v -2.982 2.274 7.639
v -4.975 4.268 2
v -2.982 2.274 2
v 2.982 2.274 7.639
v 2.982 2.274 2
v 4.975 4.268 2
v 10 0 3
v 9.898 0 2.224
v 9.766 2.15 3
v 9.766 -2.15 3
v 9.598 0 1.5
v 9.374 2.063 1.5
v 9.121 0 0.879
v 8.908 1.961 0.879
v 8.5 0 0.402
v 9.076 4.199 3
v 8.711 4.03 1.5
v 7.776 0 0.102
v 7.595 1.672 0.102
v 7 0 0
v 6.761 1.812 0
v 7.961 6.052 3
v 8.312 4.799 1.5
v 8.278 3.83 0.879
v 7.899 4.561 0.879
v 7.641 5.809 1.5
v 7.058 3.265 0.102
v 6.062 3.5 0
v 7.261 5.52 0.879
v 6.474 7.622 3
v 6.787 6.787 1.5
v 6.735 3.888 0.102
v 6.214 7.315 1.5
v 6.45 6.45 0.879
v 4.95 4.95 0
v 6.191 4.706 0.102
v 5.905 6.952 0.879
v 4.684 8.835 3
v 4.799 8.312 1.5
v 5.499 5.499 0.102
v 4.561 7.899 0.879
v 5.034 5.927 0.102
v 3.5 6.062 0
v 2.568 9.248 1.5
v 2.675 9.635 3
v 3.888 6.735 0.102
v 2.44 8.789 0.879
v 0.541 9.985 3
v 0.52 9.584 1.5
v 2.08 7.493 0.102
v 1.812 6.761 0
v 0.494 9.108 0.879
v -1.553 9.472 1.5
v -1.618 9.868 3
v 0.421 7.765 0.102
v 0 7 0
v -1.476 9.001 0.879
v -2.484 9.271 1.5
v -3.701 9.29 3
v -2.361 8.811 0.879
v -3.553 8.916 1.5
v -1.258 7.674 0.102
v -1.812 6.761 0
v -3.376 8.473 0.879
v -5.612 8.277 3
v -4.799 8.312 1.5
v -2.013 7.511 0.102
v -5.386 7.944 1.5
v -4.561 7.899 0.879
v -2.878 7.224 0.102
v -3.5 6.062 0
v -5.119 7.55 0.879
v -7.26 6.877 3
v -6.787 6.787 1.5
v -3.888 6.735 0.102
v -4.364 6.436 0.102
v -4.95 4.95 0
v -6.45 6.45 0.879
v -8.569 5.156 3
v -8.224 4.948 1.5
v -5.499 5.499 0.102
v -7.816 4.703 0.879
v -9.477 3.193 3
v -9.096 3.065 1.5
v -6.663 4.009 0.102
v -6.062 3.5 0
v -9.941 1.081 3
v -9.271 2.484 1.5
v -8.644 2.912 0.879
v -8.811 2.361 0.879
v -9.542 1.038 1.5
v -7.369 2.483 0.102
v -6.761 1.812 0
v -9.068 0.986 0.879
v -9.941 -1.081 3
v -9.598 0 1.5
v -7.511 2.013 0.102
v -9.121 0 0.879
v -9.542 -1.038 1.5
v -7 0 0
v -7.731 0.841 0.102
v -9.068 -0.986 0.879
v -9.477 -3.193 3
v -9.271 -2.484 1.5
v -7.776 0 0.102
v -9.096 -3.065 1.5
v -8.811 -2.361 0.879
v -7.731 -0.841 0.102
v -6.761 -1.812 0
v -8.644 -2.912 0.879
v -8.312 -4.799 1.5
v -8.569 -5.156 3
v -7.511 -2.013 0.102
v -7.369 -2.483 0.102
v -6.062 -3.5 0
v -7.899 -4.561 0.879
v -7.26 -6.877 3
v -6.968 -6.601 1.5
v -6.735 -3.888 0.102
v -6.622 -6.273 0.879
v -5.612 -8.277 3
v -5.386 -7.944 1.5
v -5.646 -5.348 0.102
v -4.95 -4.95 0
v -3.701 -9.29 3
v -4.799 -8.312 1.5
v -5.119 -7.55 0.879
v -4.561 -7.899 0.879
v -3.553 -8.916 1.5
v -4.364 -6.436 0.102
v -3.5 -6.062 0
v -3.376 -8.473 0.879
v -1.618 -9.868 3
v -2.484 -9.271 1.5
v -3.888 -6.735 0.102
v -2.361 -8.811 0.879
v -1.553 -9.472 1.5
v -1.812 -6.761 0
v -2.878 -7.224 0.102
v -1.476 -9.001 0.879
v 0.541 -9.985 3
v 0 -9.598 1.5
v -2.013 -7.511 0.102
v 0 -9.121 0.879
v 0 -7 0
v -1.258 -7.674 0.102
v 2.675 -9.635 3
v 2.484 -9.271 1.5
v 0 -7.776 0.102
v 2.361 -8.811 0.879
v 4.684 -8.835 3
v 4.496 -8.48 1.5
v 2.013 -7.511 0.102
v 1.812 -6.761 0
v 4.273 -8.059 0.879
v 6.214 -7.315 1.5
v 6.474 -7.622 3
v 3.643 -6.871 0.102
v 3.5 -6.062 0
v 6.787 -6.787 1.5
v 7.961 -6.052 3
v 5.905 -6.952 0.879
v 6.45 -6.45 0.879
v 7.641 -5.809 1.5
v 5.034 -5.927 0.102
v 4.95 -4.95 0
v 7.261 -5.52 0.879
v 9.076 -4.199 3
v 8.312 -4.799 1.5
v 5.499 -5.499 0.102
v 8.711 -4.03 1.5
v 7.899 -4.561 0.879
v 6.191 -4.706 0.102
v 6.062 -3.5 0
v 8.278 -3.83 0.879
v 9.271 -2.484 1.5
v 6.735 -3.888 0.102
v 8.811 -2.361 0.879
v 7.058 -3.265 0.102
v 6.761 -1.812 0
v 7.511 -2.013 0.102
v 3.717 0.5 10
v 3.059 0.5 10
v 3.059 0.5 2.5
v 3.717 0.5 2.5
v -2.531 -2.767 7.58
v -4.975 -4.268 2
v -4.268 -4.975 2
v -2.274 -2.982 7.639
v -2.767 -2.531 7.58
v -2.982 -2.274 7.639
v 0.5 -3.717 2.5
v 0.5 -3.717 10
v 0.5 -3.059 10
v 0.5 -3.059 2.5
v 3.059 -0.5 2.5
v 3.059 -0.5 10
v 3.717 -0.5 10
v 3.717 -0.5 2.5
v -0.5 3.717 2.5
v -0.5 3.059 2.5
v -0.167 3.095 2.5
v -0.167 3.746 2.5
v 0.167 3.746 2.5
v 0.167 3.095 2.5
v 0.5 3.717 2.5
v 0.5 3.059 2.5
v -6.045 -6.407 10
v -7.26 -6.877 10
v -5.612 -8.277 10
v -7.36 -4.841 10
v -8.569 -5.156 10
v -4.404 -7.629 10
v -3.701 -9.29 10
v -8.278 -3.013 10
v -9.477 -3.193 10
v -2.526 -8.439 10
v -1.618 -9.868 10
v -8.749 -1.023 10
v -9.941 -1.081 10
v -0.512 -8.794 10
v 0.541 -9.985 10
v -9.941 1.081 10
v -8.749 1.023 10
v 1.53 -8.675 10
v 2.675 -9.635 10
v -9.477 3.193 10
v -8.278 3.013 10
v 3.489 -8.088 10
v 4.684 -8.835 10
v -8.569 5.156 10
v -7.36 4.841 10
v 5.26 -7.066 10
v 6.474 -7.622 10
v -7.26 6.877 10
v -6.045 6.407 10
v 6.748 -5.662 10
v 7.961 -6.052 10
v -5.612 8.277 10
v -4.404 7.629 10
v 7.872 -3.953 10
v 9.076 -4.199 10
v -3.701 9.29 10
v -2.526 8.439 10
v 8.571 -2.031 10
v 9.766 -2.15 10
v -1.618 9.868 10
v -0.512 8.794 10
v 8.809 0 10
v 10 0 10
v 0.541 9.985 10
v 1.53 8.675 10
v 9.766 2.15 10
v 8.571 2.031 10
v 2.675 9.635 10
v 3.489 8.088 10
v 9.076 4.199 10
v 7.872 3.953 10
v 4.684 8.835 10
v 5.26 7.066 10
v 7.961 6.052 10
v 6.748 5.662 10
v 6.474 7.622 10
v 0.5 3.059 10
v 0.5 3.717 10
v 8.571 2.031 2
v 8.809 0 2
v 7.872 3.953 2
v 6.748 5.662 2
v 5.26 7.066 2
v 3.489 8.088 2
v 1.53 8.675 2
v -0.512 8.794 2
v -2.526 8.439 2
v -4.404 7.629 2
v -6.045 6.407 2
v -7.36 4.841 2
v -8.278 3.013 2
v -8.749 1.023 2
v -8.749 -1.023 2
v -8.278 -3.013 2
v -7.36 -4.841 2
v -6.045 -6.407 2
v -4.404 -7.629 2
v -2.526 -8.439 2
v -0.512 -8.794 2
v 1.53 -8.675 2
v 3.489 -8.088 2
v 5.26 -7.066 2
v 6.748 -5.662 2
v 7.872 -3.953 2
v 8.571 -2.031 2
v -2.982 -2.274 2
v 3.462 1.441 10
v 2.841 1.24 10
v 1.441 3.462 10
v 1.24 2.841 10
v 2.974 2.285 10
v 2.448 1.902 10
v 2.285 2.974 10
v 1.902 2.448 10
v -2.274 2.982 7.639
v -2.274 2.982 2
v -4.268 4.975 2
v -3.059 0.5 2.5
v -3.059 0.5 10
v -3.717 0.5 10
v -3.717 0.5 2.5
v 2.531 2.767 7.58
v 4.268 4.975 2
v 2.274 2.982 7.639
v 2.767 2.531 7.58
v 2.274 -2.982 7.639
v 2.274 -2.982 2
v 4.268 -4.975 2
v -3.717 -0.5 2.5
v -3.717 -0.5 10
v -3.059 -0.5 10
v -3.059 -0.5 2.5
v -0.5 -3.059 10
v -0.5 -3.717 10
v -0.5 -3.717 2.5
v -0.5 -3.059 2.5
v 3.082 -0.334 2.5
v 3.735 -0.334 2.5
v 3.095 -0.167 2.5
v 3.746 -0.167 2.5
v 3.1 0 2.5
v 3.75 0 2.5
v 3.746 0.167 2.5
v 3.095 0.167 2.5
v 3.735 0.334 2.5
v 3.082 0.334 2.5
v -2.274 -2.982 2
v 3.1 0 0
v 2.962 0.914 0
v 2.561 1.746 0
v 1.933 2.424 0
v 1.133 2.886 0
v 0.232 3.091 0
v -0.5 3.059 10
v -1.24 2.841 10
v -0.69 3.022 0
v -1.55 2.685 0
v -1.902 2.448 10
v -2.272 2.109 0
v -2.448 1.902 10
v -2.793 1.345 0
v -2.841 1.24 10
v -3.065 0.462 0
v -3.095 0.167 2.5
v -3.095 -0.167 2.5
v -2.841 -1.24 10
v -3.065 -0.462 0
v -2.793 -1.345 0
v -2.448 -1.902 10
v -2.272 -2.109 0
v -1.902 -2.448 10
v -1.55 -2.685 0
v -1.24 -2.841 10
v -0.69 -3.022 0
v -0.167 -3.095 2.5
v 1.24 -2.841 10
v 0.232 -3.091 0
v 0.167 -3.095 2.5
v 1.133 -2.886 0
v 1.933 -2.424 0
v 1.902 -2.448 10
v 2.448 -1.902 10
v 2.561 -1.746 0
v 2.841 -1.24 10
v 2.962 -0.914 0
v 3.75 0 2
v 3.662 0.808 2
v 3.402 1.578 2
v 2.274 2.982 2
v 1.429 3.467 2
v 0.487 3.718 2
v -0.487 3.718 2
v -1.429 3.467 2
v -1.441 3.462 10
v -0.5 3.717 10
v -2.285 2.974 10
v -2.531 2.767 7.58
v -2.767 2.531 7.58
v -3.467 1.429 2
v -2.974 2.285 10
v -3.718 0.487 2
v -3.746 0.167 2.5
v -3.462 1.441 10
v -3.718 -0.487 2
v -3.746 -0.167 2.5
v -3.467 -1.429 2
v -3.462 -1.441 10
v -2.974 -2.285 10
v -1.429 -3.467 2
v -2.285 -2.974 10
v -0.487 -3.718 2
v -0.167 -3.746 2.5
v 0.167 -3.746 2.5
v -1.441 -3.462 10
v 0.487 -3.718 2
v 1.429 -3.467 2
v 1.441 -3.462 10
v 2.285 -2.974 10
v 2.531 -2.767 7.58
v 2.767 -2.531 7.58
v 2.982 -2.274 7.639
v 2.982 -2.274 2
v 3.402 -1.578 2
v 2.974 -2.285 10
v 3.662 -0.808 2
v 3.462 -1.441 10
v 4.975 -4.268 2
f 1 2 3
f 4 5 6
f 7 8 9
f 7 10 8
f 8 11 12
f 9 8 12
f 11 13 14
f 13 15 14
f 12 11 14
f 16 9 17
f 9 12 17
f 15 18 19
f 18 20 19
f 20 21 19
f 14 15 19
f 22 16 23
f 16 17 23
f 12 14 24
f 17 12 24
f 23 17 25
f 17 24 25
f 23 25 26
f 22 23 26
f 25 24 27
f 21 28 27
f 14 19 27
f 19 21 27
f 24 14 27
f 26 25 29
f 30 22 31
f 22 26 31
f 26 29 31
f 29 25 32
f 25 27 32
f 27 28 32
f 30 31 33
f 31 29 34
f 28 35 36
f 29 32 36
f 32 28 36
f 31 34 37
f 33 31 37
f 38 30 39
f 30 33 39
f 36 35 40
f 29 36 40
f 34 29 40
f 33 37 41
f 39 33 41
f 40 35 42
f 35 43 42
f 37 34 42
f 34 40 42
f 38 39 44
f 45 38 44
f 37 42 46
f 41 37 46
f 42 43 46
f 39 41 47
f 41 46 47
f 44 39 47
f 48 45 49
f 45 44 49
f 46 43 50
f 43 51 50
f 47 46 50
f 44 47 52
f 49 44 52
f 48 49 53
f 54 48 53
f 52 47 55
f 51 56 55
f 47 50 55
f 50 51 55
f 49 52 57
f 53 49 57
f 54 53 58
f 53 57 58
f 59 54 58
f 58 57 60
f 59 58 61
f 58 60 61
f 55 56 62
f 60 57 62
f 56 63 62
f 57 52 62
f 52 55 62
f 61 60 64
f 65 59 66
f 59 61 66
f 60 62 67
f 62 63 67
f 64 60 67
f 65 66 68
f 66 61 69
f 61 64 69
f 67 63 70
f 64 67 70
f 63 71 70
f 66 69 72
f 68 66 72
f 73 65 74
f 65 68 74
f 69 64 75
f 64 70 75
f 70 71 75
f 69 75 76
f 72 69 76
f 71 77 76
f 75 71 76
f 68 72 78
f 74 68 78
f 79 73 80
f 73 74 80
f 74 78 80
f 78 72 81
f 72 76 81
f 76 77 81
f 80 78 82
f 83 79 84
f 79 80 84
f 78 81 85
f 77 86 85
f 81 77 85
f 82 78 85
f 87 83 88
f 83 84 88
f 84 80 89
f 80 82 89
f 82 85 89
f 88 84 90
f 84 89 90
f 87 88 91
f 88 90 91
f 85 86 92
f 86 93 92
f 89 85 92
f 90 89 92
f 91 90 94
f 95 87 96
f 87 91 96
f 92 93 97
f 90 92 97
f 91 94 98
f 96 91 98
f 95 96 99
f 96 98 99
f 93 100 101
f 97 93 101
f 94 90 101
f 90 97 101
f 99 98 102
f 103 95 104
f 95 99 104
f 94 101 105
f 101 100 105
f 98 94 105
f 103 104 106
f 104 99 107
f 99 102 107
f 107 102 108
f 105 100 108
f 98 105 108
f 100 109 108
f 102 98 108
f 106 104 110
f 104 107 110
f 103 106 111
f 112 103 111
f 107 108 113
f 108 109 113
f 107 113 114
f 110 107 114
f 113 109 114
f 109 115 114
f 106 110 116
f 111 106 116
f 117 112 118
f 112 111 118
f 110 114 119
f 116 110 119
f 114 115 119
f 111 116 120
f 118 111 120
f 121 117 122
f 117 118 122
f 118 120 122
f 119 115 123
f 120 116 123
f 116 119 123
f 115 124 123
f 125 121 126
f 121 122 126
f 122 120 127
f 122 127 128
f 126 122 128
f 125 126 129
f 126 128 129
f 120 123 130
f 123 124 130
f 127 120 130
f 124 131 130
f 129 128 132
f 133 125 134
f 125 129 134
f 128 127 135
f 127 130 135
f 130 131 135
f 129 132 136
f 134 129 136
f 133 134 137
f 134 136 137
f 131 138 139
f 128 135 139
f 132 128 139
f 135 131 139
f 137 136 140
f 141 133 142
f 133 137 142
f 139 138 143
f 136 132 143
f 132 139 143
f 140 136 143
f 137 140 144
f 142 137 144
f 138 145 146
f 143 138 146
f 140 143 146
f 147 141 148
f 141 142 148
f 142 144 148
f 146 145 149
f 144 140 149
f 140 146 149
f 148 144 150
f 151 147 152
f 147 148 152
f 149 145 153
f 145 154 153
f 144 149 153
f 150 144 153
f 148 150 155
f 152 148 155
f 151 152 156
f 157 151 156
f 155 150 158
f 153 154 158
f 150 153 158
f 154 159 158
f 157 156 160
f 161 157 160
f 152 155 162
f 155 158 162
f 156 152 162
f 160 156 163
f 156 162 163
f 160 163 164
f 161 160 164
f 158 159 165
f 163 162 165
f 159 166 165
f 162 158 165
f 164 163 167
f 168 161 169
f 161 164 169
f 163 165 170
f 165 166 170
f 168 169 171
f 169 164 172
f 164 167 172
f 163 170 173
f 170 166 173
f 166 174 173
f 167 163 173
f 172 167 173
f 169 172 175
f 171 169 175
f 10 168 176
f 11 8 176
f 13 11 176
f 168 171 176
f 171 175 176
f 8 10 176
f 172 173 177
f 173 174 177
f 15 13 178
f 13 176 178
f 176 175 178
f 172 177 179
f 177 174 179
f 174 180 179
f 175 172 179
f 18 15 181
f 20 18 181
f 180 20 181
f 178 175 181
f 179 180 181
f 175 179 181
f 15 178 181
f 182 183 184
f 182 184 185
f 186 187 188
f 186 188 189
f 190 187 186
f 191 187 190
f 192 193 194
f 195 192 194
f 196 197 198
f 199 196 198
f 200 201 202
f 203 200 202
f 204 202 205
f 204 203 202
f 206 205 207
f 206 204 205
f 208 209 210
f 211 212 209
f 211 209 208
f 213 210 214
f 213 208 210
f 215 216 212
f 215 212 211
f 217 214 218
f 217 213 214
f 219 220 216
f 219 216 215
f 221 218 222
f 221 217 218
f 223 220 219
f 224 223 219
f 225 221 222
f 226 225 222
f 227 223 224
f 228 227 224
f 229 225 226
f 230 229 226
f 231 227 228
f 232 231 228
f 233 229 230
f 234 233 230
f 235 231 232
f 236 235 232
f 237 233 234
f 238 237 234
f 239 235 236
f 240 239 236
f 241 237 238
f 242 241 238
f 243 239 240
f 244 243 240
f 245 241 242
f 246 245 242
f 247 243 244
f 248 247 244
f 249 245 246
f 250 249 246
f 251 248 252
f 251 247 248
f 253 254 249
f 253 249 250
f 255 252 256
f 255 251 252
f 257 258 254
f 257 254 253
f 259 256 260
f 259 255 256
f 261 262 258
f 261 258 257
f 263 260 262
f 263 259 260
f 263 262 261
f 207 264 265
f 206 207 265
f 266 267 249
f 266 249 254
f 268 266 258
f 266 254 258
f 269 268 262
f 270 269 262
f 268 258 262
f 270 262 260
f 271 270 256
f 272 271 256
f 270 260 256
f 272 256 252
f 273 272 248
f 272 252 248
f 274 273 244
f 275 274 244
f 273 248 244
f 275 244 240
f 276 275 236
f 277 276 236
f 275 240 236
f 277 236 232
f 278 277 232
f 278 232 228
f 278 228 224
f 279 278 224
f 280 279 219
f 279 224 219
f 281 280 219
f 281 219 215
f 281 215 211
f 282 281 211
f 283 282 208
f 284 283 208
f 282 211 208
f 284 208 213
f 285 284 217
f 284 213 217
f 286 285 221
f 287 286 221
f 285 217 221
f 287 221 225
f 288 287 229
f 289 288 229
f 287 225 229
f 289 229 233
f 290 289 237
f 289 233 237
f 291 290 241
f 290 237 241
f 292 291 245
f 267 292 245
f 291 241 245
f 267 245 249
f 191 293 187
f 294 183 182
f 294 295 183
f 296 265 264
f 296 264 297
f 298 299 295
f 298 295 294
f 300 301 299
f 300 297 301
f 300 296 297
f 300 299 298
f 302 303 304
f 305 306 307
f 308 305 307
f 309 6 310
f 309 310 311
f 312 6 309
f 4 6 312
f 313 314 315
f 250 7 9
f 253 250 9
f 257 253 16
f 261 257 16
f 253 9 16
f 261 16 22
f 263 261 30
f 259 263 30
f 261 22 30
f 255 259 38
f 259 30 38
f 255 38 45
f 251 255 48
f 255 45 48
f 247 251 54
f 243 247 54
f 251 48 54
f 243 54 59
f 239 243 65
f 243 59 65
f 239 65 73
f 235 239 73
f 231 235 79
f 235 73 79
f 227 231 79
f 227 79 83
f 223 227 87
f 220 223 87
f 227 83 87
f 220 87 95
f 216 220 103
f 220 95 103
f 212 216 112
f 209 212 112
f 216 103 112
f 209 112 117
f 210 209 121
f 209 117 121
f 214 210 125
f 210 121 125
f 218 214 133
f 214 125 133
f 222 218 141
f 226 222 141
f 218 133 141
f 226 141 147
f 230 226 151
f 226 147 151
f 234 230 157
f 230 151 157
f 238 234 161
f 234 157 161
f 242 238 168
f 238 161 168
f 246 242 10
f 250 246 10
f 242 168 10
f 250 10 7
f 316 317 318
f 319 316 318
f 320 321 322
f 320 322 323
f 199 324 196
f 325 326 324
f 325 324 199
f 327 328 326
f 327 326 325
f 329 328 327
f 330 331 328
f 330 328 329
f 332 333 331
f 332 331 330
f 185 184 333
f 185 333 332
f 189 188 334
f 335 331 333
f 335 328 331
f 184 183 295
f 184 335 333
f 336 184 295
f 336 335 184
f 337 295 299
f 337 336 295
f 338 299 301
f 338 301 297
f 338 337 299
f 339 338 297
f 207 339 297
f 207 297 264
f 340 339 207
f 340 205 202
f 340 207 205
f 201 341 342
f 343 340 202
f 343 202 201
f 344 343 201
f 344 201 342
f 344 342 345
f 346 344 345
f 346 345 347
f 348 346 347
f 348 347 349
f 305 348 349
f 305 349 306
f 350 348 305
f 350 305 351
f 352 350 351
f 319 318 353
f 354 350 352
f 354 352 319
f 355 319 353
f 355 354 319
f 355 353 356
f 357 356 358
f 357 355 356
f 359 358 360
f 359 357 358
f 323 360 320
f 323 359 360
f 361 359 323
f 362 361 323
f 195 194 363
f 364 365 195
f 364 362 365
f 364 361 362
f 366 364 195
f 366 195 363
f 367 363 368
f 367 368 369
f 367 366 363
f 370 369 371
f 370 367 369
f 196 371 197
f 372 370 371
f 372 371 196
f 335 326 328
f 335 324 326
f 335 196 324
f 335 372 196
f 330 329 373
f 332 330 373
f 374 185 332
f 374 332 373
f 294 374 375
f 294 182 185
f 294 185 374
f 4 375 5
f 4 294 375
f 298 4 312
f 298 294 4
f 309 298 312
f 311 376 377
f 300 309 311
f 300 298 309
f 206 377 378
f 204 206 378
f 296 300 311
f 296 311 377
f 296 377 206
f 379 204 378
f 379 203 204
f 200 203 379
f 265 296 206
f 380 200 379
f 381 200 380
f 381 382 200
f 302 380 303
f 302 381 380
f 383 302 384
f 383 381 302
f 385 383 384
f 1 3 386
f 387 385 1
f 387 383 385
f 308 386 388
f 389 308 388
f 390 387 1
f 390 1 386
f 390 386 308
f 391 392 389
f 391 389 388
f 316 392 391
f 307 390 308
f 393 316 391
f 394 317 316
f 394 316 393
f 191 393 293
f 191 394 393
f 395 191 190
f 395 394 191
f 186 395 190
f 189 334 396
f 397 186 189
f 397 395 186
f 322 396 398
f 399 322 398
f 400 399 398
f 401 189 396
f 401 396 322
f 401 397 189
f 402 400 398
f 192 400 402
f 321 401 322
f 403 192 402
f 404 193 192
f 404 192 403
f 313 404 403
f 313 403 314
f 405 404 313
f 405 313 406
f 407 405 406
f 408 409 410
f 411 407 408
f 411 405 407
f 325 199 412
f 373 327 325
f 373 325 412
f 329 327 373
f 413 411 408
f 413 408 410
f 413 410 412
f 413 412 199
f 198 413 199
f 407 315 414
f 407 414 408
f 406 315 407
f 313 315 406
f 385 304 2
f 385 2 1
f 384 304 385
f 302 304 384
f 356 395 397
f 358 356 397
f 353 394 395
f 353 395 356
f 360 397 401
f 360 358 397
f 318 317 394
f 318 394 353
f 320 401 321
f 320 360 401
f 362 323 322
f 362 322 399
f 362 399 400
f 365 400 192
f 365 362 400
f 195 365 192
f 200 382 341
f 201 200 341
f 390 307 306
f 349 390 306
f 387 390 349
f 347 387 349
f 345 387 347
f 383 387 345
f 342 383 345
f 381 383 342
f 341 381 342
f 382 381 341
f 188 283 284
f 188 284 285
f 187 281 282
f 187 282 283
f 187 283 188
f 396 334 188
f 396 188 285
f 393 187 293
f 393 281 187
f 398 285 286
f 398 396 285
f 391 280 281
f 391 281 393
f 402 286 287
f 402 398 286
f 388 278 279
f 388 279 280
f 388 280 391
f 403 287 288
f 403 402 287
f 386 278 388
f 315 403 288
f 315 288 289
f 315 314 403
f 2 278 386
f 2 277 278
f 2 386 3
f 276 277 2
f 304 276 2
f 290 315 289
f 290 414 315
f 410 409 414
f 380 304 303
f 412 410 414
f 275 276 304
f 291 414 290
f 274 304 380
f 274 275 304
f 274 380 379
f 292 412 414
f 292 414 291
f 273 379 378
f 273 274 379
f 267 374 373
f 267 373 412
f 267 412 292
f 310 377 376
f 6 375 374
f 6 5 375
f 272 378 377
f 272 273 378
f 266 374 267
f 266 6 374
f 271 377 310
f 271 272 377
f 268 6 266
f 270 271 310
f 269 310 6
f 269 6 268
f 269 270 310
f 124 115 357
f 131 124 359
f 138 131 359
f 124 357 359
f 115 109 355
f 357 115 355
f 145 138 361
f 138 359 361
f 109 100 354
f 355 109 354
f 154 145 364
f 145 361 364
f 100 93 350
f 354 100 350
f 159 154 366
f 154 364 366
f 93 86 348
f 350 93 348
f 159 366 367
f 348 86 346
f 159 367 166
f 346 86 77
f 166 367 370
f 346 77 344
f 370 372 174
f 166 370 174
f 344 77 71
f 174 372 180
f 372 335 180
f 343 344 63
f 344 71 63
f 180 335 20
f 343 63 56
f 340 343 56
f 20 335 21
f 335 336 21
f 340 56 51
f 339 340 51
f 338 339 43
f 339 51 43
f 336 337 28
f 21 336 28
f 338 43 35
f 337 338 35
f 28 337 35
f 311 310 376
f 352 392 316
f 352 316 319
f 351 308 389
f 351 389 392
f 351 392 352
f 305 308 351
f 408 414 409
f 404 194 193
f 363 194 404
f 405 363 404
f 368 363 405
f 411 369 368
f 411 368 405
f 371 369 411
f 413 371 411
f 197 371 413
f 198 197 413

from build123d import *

# Parameters (mm, degrees)
F0_R         = 10
F0_R_2       = 3.1
F1_DEPTH     = 10
F2_R         = 8.8088832383
F2_R_2       = 3.75
F3_DEPTH     = 8
F4_W         = 1
F4_H         = 3.2863240922
F4_W_2       = 2.5055953301
F4_H_2       = 1
F5_DEPTH     = 7.5
F6_R         = 3
F8_DEPTH     = 6
F9_T4_DEPTH  = 1
F9_S5_R      = 3.75
F9_T6_DEPTH  = 5
F9_T10_DEPTH = 1
F9_S11_R     = 3.75
F9_T12_DEPTH = 5
F9_T16_DEPTH = 1
F9_S17_R     = 3.75
F9_T18_DEPTH = 5
F9_T22_DEPTH = 1
F9_S23_R     = 3.75
F9_T24_DEPTH = 5


# Not quite as in the source:
# - a fillet or chamfer that OpenCascade refuses, or shapes differently, is made with other operations: its cross-section is extruded or revolved along the edge and cut away or added
# - two fillets or chamfers of one size are made in one step


with BuildPart() as f1:
    # F0 (on Top) → F1 (new body)
    with BuildSketch(Plane.XY):
        Circle(F0_R)
        Circle(F0_R_2, mode=Mode.SUBTRACT)
    extrude(amount=F1_DEPTH)

    # F2 (on face) → F3 (cut)
    with BuildSketch(Plane.XY.offset(10)):
        Circle(F2_R)
        Circle(F2_R_2, mode=Mode.SUBTRACT)
    extrude(amount=-F3_DEPTH, mode=Mode.SUBTRACT)

    # F4 (on face) → F5 (cut)
    with BuildSketch(Plane.XY.offset(10)):
        Polygon((-2.7353764913, 0.5), (-4.8153767841, 0.5), (-4.8553765493, -0.5), (-2.7353764913, -0.5), align=None)
        Polygon((-0.5, 4.8884870484), (-0.5, 4.6887658536), (-0.5, 1.9834490959), (0.5, 1.9834490959), (0.5, 4.8884870484), align=None)
        with Locations((0, -3.2546973671)):
            Rectangle(F4_W, F4_H)
        with Locations((3.5874212626, 0)):
            Rectangle(F4_W_2, F4_H_2)
    extrude(amount=-F5_DEPTH, mode=Mode.SUBTRACT)

    # F6
    f6_edges = [f1.edges().sort_by_distance(p)[0] for p in [
        (-10, 0, 0),
    ]]
    fillet(f6_edges, radius=F6_R)

    # F7 (on face) → F8 (join)
    with BuildSketch(Plane.XY.offset(2)):
        Polygon((-4.9753358018, 4.2682290206), (-2.9815278958, 2.2744211146), (-2.2744211146, 2.9815278958), (-4.2682290206, 4.9753358018), align=None)
        Polygon((2.2744211146, 2.9815278958), (2.9815278958, 2.2744211146), (4.9753358018, 4.2682290206), (4.2682290206, 4.9753358018), align=None)
        Polygon((-2.2744211146, -2.9815278958), (-2.9815278958, -2.2744211146), (-4.9753358018, -4.2682290206), (-4.2682290206, -4.9753358018), align=None)
        Polygon((2.9815278958, -2.2744211146), (2.2744211146, -2.9815278958), (4.2682290206, -4.9753358018), (4.9753358018, -4.2682290206), align=None)
    extrude(amount=F8_DEPTH)

    # F9: chamfer of 6 x 3 on 4 edges, made by hand


with BuildPart() as f9_tool2:
    # F9_s3 → F9_t4 (new body)
    with BuildSketch(Plane(origin=(0.3535533906, 0.3535533906, 0), x_dir=(0, 0, 1), z_dir=(-0.7071067812, -0.7071067812, 0))):
        Polygon((2, 6.5361873683), (8, 3.5361873683), (8, 6.5361873683), align=None)
    extrude(amount=F9_T4_DEPTH)

    # F9_s5 → F9_t6 (cut, symmetric)
    with BuildSketch(Plane.XY.offset(5)):
        Circle(F9_S5_R)
    extrude(amount=F9_T6_DEPTH, both=True, mode=Mode.SUBTRACT)


with BuildPart() as f1_1:
    add(f1.part)

    # F9_t1: cut F9_tool2
    add(f9_tool2.part, mode=Mode.SUBTRACT)


with BuildPart() as f9_tool8:
    # F9_s9 → F9_t10 (new body)
    with BuildSketch(Plane(origin=(-0.3535533906, -0.3535533906, 0), x_dir=(0, 0, 1), z_dir=(0.7071067812, 0.7071067812, 0))):
        Polygon((2, 6.5361873683), (8, 3.5361873683), (8, 6.5361873683), align=None)
    extrude(amount=F9_T10_DEPTH)

    # F9_s11 → F9_t12 (cut, symmetric)
    with BuildSketch(Plane.XY.offset(5)):
        Circle(F9_S11_R)
    extrude(amount=F9_T12_DEPTH, both=True, mode=Mode.SUBTRACT)


with BuildPart() as f1_2:
    add(f1_1.part)

    # F9_t7: cut F9_tool8
    add(f9_tool8.part, mode=Mode.SUBTRACT)


with BuildPart() as f9_tool14:
    # F9_s15 → F9_t16 (new body)
    with BuildSketch(Plane(origin=(0.3535533906, -0.3535533906, 0), x_dir=(0, 0, 1), z_dir=(-0.7071067812, 0.7071067812, 0))):
        Polygon((2, 6.5361873683), (8, 3.5361873683), (8, 6.5361873683), align=None)
    extrude(amount=F9_T16_DEPTH)

    # F9_s17 → F9_t18 (cut, symmetric)
    with BuildSketch(Plane.XY.offset(5)):
        Circle(F9_S17_R)
    extrude(amount=F9_T18_DEPTH, both=True, mode=Mode.SUBTRACT)


with BuildPart() as f1_3:
    add(f1_2.part)

    # F9_t13: cut F9_tool14
    add(f9_tool14.part, mode=Mode.SUBTRACT)


with BuildPart() as f9_tool20:
    # F9_s21 → F9_t22 (new body)
    with BuildSketch(Plane(origin=(-0.3535533906, 0.3535533906, 0), x_dir=(0, 0, 1), z_dir=(0.7071067812, -0.7071067812, 0))):
        Polygon((2, 6.5361873683), (8, 3.5361873683), (8, 6.5361873683), align=None)
    extrude(amount=F9_T22_DEPTH)

    # F9_s23 → F9_t24 (cut, symmetric)
    with BuildSketch(Plane.XY.offset(5)):
        Circle(F9_S23_R)
    extrude(amount=F9_T24_DEPTH, both=True, mode=Mode.SUBTRACT)


with BuildPart() as f1_4:
    add(f1_3.part)

    # F9_t19: cut F9_tool20
    add(f9_tool20.part, mode=Mode.SUBTRACT)


solid = f1_4.part
